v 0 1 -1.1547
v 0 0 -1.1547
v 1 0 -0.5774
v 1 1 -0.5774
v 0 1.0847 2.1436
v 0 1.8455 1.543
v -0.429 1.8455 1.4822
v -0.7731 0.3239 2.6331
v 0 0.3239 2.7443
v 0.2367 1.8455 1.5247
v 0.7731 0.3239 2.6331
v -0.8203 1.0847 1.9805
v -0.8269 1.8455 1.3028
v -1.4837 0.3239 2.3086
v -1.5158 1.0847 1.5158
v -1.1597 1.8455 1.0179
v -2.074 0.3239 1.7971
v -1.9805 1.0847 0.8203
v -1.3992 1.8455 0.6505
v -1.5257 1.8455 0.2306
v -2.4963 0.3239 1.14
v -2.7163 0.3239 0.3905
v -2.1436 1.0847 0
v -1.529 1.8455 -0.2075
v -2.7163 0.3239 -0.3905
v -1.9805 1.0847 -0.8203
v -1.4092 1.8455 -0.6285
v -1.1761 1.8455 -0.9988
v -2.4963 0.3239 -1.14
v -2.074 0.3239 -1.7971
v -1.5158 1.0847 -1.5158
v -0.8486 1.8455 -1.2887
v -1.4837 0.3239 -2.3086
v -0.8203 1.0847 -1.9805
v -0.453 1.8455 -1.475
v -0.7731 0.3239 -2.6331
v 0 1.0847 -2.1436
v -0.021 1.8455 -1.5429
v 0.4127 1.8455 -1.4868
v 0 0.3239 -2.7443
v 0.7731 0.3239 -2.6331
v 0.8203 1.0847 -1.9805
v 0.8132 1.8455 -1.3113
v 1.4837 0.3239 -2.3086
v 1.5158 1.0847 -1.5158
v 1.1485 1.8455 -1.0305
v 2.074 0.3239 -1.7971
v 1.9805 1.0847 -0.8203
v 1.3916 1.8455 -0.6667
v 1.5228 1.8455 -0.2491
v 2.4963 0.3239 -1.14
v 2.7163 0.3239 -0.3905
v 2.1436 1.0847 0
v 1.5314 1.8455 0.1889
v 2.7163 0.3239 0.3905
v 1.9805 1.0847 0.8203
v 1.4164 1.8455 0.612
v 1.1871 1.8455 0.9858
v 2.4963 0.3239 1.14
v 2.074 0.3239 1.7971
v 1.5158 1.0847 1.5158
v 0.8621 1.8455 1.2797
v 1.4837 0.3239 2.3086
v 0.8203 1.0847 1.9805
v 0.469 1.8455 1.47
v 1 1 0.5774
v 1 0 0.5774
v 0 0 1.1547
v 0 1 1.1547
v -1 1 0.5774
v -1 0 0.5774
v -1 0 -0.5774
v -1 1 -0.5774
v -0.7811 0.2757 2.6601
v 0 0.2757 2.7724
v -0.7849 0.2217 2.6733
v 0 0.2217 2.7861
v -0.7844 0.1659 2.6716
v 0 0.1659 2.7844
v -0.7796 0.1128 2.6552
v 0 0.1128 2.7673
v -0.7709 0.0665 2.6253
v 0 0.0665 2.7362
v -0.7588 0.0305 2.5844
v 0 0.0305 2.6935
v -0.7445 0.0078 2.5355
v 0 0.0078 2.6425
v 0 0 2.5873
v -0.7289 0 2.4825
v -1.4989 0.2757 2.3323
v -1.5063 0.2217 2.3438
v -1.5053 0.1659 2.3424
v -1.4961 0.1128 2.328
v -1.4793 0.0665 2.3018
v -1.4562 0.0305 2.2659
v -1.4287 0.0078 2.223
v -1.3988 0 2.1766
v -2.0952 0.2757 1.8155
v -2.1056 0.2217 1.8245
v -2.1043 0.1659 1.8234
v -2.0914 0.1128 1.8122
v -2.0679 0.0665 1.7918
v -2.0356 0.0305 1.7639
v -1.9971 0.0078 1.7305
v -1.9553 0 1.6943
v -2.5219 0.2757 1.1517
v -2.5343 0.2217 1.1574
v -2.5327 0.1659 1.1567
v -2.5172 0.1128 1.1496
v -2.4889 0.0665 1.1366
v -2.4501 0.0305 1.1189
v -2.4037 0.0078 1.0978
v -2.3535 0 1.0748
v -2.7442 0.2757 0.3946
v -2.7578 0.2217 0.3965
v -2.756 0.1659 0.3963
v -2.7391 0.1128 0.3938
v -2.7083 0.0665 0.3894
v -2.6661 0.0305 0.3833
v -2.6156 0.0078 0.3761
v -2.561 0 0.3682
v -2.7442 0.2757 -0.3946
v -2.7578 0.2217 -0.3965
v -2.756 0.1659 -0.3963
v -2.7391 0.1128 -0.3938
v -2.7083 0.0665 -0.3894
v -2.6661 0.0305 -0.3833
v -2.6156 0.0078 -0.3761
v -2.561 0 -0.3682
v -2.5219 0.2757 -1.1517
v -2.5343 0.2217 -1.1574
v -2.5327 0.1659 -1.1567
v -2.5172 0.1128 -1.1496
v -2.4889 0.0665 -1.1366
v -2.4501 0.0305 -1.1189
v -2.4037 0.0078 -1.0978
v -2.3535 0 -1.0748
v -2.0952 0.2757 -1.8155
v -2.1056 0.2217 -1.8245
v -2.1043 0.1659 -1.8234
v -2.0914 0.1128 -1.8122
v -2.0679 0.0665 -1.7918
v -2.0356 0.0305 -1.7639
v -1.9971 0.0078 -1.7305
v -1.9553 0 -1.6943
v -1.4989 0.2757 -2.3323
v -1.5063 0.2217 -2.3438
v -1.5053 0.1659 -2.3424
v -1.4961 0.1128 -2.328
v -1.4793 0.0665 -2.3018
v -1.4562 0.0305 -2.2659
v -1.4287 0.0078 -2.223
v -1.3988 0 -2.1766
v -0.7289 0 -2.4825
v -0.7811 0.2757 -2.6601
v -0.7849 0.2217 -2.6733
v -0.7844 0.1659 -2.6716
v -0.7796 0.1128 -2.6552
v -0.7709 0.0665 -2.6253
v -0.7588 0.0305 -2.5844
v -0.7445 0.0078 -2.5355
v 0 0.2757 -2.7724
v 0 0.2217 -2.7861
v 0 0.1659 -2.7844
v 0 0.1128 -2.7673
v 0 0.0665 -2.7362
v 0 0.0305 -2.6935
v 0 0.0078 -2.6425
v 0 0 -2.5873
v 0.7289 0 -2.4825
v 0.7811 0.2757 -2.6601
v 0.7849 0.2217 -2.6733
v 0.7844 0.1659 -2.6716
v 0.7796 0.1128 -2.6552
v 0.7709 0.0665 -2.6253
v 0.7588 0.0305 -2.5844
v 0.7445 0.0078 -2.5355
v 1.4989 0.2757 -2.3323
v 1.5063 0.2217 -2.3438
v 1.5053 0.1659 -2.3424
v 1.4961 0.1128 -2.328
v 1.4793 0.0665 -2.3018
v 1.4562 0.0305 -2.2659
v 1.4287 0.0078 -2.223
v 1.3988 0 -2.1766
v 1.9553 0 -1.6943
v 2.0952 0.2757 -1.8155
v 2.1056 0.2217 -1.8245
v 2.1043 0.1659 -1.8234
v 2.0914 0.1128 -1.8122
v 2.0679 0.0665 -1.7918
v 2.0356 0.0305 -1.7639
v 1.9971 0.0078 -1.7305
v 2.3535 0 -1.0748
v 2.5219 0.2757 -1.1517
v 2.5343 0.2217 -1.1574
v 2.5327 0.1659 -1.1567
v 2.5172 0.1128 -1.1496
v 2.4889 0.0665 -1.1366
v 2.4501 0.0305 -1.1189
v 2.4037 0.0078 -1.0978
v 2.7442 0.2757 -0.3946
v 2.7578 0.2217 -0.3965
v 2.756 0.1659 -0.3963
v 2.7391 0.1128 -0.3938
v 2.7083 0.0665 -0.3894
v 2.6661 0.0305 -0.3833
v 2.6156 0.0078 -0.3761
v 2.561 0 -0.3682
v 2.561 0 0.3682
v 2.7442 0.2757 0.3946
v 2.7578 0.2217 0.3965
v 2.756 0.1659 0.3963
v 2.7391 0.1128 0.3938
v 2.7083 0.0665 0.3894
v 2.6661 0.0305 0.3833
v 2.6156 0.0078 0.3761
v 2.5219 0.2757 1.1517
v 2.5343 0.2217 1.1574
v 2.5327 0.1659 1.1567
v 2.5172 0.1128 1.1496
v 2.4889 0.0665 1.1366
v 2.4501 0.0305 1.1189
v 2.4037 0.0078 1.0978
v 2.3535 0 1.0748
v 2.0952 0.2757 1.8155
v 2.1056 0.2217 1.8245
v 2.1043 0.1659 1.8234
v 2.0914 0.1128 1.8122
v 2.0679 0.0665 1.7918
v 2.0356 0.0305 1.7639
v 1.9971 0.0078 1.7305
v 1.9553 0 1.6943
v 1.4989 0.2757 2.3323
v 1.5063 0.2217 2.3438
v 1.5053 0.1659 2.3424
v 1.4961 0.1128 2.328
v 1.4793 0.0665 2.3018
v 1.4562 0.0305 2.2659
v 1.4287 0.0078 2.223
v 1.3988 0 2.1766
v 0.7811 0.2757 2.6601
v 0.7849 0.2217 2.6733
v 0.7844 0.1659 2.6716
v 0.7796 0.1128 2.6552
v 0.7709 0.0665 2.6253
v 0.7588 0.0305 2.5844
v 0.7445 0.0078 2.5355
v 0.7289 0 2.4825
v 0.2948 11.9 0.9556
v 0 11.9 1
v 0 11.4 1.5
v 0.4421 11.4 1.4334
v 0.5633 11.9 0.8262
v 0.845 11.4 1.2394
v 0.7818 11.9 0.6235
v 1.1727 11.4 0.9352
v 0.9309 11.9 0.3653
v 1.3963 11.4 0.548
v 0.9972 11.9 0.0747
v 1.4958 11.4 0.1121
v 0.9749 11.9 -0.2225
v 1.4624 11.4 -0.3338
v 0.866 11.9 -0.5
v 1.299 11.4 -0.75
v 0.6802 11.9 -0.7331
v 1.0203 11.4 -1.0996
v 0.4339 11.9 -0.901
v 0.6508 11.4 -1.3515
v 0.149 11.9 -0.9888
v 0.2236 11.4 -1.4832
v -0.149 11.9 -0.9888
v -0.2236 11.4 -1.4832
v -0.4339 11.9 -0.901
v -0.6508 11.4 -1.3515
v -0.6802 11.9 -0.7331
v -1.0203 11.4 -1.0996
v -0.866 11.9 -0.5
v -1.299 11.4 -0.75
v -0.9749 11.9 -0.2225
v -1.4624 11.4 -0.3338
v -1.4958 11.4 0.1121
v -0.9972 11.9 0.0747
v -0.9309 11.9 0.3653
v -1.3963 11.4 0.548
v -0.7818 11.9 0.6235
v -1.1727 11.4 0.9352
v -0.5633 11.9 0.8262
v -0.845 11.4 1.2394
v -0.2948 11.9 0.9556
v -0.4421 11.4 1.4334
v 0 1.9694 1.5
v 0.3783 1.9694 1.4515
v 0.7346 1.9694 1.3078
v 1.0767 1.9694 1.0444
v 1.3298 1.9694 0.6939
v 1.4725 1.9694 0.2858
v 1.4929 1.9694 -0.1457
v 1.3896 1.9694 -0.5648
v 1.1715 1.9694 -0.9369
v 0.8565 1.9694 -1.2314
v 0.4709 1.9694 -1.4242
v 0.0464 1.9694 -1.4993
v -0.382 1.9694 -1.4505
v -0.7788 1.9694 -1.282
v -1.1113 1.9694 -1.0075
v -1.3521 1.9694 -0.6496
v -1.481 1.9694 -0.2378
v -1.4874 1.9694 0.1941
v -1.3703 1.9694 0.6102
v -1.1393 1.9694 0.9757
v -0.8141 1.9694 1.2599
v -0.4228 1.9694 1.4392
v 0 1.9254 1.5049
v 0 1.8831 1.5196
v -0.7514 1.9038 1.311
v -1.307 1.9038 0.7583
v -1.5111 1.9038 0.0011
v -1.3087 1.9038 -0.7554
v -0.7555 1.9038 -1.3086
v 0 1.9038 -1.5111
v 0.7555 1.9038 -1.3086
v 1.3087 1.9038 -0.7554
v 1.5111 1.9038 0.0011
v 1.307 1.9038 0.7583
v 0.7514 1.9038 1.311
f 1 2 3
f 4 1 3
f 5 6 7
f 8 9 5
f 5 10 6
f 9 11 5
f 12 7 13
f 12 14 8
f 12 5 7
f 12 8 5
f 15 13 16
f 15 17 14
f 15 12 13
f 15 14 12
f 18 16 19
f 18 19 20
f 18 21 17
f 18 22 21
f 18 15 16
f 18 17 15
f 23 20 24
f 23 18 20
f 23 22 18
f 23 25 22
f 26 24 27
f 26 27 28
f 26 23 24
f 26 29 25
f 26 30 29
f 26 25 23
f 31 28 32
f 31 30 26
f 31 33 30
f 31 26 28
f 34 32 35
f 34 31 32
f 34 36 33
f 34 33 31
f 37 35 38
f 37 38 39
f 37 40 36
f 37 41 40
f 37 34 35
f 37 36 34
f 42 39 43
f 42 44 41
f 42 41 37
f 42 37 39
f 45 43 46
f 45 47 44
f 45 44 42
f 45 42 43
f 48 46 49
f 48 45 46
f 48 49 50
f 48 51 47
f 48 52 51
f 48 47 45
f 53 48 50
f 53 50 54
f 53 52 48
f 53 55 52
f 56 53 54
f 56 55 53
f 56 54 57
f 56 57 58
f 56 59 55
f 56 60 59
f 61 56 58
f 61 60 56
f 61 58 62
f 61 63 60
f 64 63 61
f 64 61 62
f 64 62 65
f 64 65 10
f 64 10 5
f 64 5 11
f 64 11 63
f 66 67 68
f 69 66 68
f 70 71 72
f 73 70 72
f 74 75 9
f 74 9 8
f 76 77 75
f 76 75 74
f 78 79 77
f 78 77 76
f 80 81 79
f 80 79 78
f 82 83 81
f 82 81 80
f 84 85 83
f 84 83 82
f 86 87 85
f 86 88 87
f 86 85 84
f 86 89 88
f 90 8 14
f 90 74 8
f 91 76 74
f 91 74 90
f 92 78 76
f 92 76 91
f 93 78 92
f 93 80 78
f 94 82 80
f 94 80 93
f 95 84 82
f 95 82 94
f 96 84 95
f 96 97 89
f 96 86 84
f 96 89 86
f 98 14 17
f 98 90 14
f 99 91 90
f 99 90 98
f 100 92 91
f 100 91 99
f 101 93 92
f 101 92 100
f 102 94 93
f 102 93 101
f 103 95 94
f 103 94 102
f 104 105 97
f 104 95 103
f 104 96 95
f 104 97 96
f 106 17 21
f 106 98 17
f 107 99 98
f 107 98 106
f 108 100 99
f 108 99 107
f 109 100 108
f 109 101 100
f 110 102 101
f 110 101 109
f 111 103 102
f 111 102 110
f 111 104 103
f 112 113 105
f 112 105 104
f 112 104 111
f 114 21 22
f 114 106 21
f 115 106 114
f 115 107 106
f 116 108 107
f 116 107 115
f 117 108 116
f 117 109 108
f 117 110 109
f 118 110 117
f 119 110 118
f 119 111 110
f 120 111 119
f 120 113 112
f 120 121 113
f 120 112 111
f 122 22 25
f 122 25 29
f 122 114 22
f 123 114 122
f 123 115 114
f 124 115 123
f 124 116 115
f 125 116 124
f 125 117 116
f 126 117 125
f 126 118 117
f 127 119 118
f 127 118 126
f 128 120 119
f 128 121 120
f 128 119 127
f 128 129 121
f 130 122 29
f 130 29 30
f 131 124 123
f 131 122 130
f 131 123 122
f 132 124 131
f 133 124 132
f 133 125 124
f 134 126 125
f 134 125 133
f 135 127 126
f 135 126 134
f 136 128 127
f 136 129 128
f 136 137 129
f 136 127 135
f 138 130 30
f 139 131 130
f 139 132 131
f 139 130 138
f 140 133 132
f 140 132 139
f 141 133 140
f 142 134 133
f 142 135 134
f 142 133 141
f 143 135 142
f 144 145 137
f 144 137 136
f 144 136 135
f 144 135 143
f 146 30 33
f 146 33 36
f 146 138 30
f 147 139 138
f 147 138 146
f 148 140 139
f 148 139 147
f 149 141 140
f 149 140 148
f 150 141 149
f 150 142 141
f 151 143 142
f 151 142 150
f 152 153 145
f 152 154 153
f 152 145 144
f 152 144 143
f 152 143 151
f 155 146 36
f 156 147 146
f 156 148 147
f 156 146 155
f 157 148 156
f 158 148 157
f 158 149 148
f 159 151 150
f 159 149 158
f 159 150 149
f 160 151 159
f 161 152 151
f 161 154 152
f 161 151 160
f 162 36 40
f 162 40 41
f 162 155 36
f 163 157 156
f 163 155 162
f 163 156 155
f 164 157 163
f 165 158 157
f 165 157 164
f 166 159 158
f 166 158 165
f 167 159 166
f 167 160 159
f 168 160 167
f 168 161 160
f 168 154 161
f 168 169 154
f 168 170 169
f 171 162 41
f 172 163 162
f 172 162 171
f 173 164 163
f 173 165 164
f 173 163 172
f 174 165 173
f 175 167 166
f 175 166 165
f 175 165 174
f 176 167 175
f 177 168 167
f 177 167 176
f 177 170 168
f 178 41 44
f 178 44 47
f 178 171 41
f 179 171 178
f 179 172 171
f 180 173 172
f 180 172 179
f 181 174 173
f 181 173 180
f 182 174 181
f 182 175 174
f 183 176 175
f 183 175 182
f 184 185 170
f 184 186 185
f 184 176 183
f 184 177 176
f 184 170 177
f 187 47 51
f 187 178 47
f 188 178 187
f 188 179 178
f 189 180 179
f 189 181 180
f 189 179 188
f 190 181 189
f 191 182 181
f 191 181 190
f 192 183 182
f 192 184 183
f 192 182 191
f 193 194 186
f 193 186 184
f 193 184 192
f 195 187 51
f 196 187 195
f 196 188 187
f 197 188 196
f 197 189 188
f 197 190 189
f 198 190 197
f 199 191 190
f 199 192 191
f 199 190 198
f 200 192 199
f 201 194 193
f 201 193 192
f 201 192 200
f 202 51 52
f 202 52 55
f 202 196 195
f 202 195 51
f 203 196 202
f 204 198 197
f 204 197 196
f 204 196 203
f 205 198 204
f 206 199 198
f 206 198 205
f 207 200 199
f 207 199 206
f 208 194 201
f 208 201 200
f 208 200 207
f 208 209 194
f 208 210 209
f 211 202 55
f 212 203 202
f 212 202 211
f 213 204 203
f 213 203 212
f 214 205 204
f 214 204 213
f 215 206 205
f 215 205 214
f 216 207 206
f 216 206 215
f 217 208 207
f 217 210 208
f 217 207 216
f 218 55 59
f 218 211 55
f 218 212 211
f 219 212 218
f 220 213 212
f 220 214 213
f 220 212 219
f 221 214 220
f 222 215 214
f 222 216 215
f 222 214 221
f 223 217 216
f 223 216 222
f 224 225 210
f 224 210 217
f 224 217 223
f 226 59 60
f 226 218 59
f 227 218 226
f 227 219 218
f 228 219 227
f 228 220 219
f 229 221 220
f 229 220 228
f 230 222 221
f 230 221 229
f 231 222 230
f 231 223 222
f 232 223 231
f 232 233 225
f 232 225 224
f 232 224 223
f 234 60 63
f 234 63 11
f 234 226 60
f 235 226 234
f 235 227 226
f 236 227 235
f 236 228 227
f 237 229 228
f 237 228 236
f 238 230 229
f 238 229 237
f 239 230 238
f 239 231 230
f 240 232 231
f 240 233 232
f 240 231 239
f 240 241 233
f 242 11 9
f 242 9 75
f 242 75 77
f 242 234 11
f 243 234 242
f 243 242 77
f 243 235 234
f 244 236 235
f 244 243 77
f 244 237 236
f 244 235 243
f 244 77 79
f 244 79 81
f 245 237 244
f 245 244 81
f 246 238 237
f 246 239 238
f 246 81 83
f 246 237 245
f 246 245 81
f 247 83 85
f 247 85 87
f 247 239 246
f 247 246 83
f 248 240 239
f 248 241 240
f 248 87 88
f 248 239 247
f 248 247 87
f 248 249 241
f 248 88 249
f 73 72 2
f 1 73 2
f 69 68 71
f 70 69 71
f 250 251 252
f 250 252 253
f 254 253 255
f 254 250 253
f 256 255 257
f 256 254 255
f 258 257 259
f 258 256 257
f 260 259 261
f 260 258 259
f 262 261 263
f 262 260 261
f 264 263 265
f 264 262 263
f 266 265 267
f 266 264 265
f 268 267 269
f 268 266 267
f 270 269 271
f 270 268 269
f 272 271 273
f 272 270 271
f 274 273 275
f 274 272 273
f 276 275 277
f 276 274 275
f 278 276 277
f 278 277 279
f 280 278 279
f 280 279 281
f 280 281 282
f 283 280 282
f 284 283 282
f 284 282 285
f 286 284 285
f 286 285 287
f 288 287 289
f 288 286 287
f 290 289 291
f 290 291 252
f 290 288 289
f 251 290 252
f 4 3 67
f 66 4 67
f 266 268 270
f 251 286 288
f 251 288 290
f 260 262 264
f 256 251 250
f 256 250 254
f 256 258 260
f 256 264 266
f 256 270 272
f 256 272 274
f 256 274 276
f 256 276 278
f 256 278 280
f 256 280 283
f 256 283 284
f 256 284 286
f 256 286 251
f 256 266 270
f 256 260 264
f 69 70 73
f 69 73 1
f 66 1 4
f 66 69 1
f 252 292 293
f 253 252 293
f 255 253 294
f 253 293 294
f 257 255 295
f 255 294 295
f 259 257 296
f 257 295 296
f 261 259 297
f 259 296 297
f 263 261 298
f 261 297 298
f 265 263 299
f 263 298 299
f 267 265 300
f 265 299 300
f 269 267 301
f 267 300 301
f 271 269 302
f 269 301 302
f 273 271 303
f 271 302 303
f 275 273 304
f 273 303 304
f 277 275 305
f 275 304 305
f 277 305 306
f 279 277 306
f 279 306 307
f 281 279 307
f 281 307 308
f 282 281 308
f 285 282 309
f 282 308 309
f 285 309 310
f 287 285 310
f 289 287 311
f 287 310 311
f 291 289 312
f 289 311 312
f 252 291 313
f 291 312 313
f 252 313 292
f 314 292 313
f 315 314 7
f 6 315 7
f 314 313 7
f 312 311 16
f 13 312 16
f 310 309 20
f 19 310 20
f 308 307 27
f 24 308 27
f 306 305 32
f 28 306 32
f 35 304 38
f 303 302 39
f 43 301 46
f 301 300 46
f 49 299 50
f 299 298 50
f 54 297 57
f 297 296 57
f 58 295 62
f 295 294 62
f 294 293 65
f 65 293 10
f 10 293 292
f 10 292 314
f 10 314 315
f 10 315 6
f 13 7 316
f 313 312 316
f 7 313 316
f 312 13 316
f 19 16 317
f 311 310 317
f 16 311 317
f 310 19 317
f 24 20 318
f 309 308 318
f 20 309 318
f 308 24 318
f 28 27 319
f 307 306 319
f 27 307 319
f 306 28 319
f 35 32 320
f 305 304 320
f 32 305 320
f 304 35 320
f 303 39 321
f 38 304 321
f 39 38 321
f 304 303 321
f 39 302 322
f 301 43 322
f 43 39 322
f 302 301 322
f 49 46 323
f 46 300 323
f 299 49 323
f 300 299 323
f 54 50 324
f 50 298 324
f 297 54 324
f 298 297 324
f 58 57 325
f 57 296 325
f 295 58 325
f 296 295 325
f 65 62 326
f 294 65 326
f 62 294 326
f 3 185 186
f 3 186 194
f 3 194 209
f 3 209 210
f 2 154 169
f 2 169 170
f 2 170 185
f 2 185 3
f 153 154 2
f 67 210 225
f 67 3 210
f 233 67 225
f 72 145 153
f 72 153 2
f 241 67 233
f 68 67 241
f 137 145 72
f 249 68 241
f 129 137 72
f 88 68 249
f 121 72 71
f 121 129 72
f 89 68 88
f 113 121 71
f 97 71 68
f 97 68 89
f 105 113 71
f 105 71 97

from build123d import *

# Parameters (mm, degrees)
SKETCH_2_R          = 1.5
EXTRUDE_1_DEPTH     = 10
CUT_EXTRUDE_1_DEPTH = 1
CHAMFER_1_SIZE      = 0.5
FILLET_1_R          = 0.2


with BuildPart() as part:
    # 草图1 → 旋转2 (revolve)
    with BuildSketch(Plane.XY, mode=Mode.PRIVATE) as revolve_2_sk:
        Polygon((0, 1.9), (1.5, 1.9), (3, 0), (0, 0), align=None)
    revolve(revolve_2_sk.sketch.rotate(Axis((0, 3.310292653, 0), (0, -1, 0)), 90), axis=Axis((0, 3.310292653, 0), (0, -1, 0)))

    # 草图2 → 凸台-拉伸1 (add)
    with BuildSketch(Plane(origin=(0, 1.9, 0), x_dir=(1, 0, 0), z_dir=(0, 1, 0))):
        with Locations(Location((0, 0, 0), (0, 0, 270))):
            Circle(SKETCH_2_R)
    extrude(amount=EXTRUDE_1_DEPTH)

    # 草图3 → 切除-拉伸1 (cut)
    with BuildSketch(Plane.XZ):
        Polygon((0, 1.154700538), (-1, 0.577350269), (-1, -0.577350269), (0, -1.154700538), (1, -0.577350269), (1, 0.577350269), align=None)
    extrude(amount=-CUT_EXTRUDE_1_DEPTH, mode=Mode.SUBTRACT)

    # 倒角1
    chamfer_1_edges = [part.edges().sort_by_distance(p)[0] for p in [
        (0, 11.9, -1.5),
    ]]
    chamfer(chamfer_1_edges, length=CHAMFER_1_SIZE)

    # 圆角1
    fillet_1_edges = [part.edges().sort_by_distance(p)[0] for p in [
        (0, 0, -3),
        (0, 1.9, -1.5),
    ]]
    fillet(fillet_1_edges, radius=FILLET_1_R)


solid = part.part
